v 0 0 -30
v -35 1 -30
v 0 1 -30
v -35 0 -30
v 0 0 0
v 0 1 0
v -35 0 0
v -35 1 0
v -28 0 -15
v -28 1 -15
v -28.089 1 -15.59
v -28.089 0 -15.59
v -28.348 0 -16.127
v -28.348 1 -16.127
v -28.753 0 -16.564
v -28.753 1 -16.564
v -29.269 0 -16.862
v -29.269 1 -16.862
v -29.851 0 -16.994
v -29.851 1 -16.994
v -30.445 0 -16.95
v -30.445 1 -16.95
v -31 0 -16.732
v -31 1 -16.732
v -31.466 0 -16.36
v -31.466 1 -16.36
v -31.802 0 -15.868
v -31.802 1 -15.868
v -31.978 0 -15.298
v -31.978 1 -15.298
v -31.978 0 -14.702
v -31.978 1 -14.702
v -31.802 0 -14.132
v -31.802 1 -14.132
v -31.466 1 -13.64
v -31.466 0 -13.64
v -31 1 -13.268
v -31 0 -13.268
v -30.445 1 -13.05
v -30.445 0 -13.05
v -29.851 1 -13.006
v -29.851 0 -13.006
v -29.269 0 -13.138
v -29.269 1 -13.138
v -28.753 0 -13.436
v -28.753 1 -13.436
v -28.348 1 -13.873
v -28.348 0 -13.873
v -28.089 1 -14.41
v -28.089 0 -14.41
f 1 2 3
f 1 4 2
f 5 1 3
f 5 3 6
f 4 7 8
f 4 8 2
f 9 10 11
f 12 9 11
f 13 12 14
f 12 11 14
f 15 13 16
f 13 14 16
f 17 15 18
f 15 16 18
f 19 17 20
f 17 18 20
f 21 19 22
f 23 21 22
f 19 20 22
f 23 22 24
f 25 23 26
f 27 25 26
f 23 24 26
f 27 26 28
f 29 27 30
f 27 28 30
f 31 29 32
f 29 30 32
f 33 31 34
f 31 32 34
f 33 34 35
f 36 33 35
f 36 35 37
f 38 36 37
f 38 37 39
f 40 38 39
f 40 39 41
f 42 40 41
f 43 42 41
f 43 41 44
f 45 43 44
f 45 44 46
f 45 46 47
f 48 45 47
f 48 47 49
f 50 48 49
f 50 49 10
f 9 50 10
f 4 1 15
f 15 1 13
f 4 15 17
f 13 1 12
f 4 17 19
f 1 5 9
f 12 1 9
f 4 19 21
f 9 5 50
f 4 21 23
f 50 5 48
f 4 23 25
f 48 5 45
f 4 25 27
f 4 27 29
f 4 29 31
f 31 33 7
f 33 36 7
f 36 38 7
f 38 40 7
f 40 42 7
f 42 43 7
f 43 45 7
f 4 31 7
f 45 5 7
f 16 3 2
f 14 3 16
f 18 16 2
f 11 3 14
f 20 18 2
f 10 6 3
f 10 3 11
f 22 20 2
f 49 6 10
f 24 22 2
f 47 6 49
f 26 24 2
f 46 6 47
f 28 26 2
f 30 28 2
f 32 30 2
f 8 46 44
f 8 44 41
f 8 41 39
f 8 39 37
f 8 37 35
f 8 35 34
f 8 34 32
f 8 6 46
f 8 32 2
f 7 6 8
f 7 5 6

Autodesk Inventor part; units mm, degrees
ref_plane "YZ Plane" through (0, 0, 0) normal (1, 0, 0) x (0, 1, 0)
ref_plane "XZ Plane" through (0, 0, 0) normal (0, 1, 0) x (-1, 0, 0)
ref_plane "XY Plane" through (0, 0, 0) normal (0, 0, 1) x (1, 0, 0)
sketch "Szkic1" plane through (0, 0, 0) normal (0, 1, 0) x (-1, 0, 0)
  line L0 (0, 0) -> (35, 0)
  line L1 (35, 0) -> (35, -30)
  line L2 (35, -30) -> (0, -30)
  line L3 (0, -30) -> (0, 0)
  dimension "d0" = 35
  dimension "d1" = 30
extrude "Wyciągnięcie proste1" add sketch "Szkic1" along normal blind 1
sketch "Szkic2" plane through (0, 1, 0) normal (0, 1, 0) x (1, 0, 0)
  line L0 (-35, 30) -> (-35, 0) projected
  line L1 (-35, 15) -> (-30, 15)
  circle A0 centre (-30, 15) radius 2
  point P0 (0, 0)
  dimension "d4" = 5
  dimension "d5" = 4
extrude "Wyciągnięcie proste2" cut sketch "Szkic2" against normal blind 1
properties part number "Tank resistive sensor"
